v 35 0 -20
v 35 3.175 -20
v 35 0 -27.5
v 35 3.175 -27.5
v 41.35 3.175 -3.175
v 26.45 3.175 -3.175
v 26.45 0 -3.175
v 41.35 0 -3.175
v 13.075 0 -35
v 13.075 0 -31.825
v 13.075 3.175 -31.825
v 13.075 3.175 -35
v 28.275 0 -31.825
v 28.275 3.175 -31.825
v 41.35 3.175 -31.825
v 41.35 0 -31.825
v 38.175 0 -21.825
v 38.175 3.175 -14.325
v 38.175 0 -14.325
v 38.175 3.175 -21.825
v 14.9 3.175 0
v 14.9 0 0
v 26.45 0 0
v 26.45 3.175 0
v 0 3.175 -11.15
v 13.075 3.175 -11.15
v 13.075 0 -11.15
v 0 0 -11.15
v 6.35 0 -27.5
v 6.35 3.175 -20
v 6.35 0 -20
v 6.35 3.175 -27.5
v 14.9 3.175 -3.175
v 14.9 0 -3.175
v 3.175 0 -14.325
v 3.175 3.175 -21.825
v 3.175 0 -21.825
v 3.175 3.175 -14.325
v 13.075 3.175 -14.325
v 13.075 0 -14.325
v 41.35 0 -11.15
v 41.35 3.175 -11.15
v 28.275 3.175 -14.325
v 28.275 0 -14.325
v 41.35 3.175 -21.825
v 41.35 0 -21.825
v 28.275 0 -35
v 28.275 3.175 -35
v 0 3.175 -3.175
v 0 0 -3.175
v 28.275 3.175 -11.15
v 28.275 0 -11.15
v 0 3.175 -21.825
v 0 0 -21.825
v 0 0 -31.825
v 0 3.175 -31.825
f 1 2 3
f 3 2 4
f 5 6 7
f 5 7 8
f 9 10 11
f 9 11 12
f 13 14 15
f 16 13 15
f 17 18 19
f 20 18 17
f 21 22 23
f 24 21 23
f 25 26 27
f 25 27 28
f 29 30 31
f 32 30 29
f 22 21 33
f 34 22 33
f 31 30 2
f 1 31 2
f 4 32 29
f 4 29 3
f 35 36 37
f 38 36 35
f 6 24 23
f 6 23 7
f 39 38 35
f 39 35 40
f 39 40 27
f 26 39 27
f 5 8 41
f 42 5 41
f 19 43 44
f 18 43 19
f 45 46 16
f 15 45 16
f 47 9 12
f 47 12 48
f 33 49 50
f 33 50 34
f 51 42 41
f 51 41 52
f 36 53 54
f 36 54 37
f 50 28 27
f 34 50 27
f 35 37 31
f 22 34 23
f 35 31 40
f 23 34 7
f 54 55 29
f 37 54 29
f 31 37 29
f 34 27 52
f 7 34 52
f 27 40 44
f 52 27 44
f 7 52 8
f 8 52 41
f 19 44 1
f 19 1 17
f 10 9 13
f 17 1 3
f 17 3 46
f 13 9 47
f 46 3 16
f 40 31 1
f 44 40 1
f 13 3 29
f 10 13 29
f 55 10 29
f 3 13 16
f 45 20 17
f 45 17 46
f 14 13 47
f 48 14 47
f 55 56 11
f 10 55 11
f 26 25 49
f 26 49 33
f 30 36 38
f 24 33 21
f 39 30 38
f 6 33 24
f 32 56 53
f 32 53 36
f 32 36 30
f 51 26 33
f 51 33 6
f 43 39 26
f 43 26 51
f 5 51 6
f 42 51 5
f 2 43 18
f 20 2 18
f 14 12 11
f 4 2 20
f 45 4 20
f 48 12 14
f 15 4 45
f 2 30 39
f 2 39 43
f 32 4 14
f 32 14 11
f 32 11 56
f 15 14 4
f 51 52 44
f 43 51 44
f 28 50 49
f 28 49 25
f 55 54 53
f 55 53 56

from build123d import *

# Parameters (mm, degrees)
SKETCH1_W           = 41.35
SKETCH1_H           = 35
BOSS_EXTRUDE1_DEPTH = 3.175
SKETCH2_W           = 28.65
SKETCH2_H           = 7.5
SKETCH2_W_2         = 13.075
SKETCH2_H_2         = 3.175
SKETCH2_W_3         = 14.9
CUT_EXTRUDE1_DEPTH  = 4.175


with BuildPart() as part:
    # Sketch1 → Boss-Extrude1 (new body)
    with BuildSketch(Plane(origin=(0, 0, 0), x_dir=(1, 0, 0), z_dir=(0, 1, 0))):
        with Locations((20.675, 17.5)):
            Rectangle(SKETCH1_W, SKETCH1_H)
    extrude(amount=BOSS_EXTRUDE1_DEPTH)

    # Sketch2 → Cut-Extrude1 (cut, through all)
    with BuildSketch(Plane(origin=(0, 3.175, 0), x_dir=(1, 0, 0), z_dir=(0, 1, 0))):
        with Locations((20.675, 23.75)):
            Rectangle(SKETCH2_W, SKETCH2_H)
        with Locations((6.5375, 33.4125)):
            Rectangle(SKETCH2_W_2, SKETCH2_H_2)
        with Locations((34.8125, 33.4125)):
            Rectangle(SKETCH2_W_2, SKETCH2_H_2)
        Polygon((38.175, 21.825), (41.35, 21.825), (41.35, 11.15), (28.275, 11.15), (28.275, 14.325), (38.175, 14.325), align=None)
        Polygon((3.175, 21.825), (3.175, 14.325), (13.075, 14.325), (13.075, 11.15), (0, 11.15), (0, 21.825), align=None)
        with Locations((33.9, 1.5875)):
            Rectangle(SKETCH2_W_3, SKETCH2_H_2)
        with Locations((7.45, 1.5875)):
            Rectangle(SKETCH2_W_3, SKETCH2_H_2)
    extrude(amount=-CUT_EXTRUDE1_DEPTH, mode=Mode.SUBTRACT)


solid = part.part
